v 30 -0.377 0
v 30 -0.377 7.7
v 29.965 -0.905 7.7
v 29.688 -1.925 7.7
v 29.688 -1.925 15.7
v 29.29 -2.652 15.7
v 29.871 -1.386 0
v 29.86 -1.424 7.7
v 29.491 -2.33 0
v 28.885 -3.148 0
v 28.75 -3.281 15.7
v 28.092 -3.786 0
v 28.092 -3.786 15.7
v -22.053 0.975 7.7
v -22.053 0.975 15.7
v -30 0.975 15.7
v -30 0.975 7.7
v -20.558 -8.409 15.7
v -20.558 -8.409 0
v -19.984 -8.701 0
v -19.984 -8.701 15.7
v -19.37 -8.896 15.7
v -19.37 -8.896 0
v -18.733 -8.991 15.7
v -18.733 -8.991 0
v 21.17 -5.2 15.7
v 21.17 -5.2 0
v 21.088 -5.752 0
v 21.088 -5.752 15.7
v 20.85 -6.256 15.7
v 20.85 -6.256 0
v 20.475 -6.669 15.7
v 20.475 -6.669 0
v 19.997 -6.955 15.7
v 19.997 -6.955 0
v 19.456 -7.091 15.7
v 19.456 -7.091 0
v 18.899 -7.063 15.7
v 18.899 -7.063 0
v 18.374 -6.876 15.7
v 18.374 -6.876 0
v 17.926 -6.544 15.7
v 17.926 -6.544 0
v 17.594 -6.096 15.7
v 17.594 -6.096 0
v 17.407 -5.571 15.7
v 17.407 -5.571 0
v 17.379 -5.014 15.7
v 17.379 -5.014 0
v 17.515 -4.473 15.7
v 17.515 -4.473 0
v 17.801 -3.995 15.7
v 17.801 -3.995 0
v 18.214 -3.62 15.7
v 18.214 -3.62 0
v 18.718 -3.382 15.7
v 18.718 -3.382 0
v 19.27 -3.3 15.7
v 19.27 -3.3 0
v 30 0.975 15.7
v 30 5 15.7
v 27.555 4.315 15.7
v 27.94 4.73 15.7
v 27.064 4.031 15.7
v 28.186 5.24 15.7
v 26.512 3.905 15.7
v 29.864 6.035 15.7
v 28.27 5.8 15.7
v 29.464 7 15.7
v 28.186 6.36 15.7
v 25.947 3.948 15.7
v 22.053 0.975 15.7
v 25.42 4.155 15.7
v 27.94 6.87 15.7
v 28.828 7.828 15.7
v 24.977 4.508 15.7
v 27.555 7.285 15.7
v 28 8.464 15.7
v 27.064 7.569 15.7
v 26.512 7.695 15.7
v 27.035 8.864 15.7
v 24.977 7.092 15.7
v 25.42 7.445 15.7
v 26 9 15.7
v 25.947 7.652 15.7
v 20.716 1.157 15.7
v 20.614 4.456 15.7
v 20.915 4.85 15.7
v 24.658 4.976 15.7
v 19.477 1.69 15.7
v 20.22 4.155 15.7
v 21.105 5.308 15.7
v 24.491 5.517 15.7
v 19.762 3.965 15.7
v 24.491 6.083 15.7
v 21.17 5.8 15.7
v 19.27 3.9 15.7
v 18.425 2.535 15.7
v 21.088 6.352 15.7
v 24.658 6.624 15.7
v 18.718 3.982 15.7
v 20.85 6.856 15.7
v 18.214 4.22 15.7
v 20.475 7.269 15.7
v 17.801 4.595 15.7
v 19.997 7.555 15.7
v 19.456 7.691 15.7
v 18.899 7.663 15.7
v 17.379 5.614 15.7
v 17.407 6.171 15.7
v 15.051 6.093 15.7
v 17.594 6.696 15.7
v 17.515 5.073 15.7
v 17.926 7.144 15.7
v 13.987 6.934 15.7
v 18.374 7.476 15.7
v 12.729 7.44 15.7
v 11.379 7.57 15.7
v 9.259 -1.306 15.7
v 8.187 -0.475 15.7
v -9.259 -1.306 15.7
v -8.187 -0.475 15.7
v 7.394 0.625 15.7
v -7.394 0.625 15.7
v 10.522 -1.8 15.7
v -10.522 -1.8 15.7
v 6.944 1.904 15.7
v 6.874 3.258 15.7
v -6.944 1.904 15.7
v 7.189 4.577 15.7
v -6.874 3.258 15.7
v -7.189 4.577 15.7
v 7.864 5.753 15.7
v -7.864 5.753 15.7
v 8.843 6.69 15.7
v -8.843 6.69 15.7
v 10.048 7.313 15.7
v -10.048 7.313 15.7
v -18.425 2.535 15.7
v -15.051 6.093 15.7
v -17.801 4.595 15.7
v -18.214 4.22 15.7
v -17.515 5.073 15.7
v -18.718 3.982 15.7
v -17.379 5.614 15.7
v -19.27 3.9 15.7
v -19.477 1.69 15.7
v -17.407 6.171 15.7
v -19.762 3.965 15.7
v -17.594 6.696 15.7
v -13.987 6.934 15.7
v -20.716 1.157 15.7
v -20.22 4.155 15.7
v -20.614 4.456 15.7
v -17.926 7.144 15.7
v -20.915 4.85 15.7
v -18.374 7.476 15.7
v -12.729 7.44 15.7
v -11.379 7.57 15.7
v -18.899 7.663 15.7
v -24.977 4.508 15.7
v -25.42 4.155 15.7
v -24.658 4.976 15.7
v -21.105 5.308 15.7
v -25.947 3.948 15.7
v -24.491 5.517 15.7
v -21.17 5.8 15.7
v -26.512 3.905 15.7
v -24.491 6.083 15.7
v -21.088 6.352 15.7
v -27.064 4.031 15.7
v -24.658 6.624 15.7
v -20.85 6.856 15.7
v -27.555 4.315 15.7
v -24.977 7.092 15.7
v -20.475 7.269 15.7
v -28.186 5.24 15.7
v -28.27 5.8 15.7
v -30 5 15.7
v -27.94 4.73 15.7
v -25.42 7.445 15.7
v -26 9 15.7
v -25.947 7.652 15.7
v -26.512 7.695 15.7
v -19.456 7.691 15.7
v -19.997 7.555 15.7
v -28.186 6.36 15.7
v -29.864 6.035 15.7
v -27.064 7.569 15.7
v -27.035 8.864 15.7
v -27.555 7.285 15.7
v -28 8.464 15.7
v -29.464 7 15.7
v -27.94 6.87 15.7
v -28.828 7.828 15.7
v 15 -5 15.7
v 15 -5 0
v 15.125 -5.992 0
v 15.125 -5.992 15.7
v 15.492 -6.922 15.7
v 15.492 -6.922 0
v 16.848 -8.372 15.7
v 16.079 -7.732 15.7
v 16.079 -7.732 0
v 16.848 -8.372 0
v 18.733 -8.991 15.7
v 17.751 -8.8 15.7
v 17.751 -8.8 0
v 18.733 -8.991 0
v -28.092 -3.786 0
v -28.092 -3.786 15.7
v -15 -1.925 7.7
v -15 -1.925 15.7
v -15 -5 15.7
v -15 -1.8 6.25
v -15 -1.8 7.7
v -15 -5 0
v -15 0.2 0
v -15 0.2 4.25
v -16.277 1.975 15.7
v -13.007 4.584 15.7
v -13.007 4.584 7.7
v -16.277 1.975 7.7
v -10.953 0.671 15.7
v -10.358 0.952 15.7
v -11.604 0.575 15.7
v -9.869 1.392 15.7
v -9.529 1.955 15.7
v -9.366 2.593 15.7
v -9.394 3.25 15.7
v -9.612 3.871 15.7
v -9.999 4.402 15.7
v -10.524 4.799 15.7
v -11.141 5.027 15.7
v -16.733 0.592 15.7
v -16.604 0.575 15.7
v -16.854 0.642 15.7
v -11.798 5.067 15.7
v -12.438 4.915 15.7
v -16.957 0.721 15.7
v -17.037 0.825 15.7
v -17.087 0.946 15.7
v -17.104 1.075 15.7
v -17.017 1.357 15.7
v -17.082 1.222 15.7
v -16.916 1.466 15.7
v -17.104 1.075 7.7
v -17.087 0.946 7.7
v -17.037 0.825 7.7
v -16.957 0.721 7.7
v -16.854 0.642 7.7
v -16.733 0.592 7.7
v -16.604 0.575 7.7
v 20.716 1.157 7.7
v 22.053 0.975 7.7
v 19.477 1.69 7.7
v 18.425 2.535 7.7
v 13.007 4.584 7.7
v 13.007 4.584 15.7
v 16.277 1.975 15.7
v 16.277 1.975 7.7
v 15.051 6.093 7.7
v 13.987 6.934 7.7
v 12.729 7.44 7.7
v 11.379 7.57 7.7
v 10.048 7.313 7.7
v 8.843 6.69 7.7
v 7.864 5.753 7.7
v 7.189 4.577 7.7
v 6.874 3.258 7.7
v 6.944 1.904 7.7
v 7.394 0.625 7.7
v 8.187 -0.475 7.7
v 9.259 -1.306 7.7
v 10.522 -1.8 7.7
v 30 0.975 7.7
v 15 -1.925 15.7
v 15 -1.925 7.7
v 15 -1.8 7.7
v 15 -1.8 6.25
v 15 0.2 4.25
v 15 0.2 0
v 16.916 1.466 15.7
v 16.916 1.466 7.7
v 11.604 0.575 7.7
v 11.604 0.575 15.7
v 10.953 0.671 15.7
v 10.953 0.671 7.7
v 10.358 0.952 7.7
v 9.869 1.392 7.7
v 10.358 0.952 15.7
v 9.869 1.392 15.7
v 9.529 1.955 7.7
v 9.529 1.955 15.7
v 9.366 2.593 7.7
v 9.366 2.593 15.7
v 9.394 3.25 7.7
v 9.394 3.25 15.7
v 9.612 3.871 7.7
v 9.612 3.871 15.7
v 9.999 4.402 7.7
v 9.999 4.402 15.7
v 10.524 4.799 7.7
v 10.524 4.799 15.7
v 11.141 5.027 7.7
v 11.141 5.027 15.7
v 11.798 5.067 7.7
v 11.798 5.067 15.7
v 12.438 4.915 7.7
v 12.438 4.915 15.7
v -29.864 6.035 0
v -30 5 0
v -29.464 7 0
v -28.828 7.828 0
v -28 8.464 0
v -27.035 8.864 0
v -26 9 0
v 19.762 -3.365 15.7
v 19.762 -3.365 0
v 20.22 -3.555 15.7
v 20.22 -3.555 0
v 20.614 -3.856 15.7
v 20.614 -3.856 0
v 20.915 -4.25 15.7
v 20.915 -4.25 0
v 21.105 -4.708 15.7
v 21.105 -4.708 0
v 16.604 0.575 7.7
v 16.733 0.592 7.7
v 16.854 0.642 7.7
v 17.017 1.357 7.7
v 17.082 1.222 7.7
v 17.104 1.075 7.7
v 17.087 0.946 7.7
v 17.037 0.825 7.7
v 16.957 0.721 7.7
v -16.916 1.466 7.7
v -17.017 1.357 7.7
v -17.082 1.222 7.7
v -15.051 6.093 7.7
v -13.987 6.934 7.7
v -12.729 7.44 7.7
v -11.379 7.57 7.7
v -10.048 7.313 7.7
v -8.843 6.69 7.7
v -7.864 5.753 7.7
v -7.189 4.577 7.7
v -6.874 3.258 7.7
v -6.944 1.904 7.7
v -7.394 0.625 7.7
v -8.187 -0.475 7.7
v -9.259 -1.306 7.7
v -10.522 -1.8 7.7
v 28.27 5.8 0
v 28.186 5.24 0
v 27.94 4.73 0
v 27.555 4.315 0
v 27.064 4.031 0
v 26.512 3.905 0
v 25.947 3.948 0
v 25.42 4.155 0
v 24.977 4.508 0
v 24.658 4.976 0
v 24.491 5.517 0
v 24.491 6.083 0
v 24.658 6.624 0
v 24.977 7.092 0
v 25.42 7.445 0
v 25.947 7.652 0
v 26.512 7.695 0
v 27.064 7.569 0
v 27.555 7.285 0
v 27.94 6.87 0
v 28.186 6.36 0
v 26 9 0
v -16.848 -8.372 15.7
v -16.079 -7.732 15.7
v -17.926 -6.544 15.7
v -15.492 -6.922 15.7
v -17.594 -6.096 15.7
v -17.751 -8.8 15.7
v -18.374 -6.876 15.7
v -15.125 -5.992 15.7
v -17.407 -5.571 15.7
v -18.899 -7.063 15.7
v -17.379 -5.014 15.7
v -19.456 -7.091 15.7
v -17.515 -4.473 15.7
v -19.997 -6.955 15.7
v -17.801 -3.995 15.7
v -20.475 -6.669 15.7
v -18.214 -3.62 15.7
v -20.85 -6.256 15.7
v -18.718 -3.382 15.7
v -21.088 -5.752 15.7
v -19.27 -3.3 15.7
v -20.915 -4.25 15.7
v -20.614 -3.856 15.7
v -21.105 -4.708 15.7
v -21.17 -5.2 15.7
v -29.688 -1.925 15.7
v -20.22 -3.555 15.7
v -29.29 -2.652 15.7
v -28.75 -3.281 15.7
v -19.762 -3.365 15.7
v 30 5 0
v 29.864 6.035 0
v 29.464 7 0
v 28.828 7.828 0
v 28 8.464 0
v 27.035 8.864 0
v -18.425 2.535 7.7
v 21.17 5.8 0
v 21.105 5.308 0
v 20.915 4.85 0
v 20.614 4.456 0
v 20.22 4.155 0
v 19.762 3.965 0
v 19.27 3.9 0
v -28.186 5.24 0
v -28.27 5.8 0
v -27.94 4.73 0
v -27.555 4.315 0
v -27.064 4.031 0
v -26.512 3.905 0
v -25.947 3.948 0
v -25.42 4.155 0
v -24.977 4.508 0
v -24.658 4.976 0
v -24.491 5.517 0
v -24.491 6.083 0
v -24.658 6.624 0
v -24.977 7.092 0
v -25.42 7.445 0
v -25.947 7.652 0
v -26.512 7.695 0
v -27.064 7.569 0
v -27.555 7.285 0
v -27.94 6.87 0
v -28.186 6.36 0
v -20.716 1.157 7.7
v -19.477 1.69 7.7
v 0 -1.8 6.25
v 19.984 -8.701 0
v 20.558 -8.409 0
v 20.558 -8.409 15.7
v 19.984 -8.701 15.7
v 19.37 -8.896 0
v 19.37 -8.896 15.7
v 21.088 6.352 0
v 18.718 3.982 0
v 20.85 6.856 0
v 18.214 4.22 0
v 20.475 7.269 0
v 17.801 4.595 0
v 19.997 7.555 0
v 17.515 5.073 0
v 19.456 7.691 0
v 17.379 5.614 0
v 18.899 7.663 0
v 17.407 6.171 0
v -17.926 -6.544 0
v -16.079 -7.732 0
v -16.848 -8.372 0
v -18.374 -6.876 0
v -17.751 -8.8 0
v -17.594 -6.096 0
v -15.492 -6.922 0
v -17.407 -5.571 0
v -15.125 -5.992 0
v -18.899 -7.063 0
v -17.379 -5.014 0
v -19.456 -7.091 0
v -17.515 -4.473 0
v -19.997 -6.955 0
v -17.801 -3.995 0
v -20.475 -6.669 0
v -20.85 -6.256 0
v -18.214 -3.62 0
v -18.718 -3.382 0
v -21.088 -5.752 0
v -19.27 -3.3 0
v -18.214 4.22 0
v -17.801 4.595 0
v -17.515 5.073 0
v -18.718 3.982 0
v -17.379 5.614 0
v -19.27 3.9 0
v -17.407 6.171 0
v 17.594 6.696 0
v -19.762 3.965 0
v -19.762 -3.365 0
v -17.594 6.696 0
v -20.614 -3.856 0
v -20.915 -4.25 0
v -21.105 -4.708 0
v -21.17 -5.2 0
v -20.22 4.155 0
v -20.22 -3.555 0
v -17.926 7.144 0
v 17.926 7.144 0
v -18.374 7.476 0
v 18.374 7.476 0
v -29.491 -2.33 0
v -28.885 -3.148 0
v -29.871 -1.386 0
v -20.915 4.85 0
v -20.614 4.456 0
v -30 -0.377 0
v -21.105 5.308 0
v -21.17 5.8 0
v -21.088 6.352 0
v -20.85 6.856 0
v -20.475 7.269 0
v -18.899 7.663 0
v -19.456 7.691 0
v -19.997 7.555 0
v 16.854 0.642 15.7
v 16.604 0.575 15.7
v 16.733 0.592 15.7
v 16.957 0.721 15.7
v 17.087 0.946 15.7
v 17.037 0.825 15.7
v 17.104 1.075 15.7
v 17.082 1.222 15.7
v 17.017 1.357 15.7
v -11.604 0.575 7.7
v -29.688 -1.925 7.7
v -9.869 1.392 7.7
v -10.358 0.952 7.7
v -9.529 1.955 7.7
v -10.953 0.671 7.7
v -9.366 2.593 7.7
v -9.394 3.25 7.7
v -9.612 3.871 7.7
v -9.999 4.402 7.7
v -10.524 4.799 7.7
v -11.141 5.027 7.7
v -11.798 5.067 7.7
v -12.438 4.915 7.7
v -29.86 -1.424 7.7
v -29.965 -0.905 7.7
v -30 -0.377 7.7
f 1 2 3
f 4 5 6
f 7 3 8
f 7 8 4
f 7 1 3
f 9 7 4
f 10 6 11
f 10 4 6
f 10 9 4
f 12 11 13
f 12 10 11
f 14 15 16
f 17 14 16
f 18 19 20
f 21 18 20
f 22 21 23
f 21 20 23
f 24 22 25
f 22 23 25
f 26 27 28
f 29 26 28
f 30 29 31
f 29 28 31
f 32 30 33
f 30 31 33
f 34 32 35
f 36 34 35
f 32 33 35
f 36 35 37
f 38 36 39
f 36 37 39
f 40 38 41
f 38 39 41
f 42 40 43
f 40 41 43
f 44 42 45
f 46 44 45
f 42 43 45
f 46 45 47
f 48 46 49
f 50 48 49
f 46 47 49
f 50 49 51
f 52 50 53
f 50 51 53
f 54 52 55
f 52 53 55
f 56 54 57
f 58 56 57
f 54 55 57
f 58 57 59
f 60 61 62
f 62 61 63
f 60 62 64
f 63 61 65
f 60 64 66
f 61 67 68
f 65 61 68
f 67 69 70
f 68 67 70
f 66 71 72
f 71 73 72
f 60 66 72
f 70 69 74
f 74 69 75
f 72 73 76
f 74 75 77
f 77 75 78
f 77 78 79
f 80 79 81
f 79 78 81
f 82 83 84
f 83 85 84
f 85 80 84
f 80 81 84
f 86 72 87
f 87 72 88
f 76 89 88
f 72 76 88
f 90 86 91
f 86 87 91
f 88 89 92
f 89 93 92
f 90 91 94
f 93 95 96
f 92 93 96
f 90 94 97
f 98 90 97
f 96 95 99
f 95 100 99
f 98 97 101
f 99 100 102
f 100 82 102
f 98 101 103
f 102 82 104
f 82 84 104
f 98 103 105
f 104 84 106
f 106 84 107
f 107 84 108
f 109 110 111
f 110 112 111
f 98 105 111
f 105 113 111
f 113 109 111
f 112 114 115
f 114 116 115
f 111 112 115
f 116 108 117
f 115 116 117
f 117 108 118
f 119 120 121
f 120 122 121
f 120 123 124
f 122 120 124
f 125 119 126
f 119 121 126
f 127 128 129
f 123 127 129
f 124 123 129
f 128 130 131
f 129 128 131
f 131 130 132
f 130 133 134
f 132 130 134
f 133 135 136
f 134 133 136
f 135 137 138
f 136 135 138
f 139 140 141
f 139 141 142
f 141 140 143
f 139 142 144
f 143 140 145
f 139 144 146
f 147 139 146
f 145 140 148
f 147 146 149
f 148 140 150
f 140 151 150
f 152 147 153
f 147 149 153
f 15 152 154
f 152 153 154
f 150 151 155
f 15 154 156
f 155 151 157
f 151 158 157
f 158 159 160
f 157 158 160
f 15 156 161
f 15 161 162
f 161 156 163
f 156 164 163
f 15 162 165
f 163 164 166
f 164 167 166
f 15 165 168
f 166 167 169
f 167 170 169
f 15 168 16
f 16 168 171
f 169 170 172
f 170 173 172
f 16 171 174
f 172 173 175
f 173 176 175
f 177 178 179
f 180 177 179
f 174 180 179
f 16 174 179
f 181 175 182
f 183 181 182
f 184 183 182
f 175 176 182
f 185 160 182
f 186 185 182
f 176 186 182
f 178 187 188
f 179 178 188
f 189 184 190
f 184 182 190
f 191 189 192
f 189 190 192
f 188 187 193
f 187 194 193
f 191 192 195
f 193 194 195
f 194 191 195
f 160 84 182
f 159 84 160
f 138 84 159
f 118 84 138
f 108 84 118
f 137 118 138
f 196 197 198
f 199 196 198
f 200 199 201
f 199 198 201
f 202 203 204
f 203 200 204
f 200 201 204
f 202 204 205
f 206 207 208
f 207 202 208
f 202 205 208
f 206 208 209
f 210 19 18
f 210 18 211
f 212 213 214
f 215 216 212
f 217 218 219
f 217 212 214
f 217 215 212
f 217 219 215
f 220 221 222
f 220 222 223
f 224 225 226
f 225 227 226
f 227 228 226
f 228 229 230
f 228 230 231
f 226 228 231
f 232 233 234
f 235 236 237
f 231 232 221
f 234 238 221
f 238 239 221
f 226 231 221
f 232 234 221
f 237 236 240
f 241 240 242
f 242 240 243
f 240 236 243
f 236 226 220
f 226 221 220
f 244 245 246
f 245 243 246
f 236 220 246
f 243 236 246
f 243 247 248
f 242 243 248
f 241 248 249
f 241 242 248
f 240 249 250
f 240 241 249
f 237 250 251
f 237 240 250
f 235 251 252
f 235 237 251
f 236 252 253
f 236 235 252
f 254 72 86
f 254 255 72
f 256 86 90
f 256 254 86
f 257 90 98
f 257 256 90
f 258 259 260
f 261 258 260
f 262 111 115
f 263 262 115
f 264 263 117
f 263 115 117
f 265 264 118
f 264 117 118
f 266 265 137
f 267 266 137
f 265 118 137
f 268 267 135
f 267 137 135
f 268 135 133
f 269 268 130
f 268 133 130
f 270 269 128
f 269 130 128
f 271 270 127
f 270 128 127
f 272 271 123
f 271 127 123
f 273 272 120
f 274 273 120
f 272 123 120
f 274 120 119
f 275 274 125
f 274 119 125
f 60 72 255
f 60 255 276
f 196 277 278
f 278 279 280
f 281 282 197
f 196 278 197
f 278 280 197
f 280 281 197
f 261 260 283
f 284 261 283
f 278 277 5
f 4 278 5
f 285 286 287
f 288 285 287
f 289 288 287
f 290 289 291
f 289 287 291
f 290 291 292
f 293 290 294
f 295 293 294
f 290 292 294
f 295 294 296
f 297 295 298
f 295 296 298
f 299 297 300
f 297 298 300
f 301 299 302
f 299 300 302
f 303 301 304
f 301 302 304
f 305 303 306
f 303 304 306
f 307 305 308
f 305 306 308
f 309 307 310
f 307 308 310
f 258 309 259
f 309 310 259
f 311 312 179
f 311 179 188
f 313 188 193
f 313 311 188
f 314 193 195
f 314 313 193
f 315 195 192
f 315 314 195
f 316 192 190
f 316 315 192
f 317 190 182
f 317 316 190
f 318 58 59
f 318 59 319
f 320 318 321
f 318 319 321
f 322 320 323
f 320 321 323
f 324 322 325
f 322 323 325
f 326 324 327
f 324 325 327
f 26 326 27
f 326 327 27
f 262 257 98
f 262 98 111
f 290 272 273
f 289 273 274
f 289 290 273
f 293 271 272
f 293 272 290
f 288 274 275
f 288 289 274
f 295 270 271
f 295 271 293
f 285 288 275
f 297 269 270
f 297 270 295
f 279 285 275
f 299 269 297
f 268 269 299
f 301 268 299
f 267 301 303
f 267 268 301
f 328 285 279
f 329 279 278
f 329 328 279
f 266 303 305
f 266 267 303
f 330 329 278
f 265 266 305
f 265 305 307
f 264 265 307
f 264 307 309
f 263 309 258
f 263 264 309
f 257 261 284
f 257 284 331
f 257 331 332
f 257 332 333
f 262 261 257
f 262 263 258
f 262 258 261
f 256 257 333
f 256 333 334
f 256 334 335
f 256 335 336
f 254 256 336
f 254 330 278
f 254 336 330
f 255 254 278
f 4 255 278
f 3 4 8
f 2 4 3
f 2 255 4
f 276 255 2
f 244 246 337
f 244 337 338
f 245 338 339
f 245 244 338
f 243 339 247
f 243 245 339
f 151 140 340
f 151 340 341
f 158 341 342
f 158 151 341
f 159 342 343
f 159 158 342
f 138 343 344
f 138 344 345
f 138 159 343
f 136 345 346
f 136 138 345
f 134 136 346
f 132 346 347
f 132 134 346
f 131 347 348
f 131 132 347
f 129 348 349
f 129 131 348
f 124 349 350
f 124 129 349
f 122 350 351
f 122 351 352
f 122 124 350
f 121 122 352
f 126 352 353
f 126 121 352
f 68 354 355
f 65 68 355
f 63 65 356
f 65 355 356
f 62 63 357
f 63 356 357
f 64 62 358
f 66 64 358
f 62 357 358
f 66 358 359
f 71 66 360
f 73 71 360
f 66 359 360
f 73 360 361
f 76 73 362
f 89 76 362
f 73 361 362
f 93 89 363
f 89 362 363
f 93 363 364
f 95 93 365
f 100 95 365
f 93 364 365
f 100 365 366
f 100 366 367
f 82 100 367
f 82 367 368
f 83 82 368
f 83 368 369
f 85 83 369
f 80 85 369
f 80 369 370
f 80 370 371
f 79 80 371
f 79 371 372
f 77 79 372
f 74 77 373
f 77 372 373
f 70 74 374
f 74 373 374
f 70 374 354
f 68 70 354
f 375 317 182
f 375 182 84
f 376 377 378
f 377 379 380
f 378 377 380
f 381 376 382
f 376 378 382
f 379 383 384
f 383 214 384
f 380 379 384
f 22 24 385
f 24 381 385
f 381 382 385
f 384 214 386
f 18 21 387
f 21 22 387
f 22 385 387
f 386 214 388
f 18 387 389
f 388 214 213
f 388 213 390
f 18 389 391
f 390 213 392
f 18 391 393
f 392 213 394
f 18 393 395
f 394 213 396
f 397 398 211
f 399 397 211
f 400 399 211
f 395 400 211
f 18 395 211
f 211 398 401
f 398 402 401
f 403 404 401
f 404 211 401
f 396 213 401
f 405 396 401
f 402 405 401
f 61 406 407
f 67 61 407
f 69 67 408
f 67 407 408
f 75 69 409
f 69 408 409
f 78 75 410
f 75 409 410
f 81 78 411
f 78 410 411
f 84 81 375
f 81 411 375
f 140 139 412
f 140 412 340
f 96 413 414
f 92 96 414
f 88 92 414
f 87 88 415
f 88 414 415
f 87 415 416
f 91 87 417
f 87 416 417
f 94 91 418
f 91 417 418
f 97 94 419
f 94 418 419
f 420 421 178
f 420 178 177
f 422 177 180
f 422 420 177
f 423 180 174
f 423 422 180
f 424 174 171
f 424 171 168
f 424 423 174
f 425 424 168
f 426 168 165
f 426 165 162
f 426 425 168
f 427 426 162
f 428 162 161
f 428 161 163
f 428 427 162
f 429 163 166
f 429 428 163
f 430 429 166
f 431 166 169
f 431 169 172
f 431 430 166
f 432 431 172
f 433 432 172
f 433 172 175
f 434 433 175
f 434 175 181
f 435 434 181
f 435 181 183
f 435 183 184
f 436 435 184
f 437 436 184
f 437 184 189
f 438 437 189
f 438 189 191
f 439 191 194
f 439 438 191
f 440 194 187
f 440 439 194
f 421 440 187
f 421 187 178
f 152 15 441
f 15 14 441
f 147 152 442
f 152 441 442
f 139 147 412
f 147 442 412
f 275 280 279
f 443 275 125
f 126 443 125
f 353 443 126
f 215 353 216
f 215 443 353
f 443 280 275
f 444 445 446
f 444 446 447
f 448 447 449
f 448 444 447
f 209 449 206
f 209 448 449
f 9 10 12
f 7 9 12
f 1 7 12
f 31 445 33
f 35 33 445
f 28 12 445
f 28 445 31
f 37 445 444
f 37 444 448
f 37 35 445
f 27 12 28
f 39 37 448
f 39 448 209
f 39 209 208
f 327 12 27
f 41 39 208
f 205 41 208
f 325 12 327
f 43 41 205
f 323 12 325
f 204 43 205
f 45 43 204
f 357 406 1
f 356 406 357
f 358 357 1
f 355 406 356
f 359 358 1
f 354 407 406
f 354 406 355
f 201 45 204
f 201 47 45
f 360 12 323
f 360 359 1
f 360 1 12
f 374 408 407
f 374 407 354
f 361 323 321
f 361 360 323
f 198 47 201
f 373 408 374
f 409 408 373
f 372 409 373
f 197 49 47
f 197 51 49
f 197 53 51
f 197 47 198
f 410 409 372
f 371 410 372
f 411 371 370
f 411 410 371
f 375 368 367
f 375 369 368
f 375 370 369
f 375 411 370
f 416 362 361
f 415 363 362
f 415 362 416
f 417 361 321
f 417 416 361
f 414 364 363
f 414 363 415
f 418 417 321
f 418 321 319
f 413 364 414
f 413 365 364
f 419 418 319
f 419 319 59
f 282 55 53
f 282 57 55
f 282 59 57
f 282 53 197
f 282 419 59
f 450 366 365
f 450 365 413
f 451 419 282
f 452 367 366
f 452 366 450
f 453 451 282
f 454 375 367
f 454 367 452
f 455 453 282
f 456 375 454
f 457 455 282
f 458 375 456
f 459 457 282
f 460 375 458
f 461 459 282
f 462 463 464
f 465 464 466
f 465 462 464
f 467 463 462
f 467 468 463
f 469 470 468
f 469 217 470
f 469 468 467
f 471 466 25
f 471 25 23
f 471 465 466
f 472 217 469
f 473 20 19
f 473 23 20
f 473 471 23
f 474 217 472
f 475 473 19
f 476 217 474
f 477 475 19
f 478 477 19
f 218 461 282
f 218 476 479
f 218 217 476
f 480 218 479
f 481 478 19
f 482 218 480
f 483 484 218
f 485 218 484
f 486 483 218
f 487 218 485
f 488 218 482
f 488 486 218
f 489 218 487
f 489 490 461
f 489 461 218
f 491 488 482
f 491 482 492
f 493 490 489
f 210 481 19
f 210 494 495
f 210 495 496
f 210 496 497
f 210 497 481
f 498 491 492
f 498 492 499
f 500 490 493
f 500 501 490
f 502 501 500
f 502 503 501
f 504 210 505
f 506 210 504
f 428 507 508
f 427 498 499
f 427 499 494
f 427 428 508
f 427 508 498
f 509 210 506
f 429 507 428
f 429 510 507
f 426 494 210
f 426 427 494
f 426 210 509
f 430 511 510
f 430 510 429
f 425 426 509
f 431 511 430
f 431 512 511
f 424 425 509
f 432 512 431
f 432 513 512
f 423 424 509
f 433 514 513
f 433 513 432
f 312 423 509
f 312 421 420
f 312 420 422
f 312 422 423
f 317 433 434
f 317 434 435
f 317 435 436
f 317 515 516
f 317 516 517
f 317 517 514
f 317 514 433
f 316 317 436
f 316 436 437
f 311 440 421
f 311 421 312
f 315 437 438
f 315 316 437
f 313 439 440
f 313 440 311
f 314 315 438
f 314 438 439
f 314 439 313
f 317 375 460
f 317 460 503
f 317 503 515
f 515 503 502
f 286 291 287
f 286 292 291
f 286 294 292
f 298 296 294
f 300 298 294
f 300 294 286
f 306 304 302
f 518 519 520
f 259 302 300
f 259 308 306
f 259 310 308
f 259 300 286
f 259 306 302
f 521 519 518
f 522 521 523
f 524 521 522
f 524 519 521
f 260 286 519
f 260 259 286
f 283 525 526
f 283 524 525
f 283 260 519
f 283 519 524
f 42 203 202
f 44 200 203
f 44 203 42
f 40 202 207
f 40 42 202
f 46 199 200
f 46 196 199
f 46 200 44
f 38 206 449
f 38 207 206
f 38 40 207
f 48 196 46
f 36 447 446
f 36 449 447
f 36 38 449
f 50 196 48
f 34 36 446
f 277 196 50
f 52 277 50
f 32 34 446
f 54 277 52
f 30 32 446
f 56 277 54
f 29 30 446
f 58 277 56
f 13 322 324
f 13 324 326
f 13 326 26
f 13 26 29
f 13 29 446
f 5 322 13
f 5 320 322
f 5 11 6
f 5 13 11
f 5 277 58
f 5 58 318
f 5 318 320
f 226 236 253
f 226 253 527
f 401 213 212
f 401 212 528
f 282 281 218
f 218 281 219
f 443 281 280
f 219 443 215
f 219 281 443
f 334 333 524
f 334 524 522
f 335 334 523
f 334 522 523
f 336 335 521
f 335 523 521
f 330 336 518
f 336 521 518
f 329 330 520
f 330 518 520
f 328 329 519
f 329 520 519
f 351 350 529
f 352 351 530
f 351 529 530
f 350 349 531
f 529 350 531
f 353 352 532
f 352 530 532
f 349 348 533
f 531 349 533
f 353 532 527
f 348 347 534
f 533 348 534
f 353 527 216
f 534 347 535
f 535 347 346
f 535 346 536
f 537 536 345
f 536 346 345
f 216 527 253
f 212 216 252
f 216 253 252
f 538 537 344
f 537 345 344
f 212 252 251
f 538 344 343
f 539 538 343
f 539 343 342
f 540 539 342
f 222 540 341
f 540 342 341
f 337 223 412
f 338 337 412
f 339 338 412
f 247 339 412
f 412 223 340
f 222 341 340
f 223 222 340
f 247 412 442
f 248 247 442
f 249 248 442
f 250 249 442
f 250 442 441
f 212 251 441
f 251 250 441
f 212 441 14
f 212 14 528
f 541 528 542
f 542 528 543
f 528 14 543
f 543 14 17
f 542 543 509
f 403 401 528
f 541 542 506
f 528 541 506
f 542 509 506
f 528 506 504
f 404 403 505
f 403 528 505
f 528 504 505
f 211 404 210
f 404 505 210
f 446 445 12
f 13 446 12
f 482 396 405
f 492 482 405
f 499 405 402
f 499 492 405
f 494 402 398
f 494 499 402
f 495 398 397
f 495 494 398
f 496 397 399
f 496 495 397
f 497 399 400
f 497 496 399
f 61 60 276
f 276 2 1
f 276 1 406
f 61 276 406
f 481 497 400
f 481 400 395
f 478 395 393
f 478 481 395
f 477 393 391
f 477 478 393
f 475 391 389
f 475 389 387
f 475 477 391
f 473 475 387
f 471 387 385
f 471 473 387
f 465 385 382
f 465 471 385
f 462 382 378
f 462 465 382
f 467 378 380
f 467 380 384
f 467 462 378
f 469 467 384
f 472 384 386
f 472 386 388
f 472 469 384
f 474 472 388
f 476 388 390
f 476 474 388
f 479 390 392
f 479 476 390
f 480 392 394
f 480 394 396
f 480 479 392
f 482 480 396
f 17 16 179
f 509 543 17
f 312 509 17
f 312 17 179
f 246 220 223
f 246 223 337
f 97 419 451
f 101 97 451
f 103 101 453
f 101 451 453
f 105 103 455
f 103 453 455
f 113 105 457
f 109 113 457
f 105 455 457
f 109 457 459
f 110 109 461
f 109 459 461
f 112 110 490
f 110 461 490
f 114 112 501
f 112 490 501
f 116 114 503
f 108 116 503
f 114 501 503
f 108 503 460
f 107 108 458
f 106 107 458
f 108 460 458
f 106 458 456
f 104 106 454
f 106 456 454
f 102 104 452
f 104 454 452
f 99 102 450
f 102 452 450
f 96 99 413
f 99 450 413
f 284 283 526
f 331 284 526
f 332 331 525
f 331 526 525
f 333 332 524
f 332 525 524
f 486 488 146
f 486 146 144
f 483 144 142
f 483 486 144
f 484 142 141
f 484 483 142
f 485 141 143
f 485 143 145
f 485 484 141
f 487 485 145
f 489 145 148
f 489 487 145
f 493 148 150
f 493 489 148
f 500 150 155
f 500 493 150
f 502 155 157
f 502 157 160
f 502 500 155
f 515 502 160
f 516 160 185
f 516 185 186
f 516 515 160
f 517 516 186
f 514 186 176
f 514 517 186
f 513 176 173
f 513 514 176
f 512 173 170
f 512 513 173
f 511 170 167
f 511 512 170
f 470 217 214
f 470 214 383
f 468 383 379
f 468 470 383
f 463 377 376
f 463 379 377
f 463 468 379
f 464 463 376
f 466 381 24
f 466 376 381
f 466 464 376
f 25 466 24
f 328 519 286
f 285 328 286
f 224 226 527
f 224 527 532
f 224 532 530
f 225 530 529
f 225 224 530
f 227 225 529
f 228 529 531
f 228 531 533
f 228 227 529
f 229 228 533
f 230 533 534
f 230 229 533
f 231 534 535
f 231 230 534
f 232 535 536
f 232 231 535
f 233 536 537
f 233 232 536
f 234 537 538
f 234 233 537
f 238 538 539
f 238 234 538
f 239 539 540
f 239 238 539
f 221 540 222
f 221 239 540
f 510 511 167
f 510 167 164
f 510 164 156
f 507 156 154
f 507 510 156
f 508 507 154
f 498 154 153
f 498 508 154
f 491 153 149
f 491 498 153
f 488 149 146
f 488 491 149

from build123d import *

# Parameters (mm, degrees)
F1_DEPTH    = 15.7
F2_W        = 10.0960650777
F2_H        = 2.9
F3_DEPTH    = 8
F4_R        = 5
F5_T1_DEPTH = 26.8923143391
F5_T3_DEPTH = 21.3473434867
F5_T5_DEPTH = 35.7
F6_W        = 15
F6_H        = 6.25
F7_DEPTH    = 2
F8_SIZE     = 1.99999


# Not quite as in the source:
# - a fillet or chamfer that OpenCascade refuses, or shapes differently, is made with other operations: its cross-section is extruded or revolved along the edge and cut away or added
# - a fillet or chamfer is up to 0.001 mm smaller than in the source, because OpenCascade refuses the exact size


with BuildPart() as f1:
    # F0 (on Top) → F1 (new body)
    with BuildSketch(Plane.XY):
        Polygon((30, 9), (0, 9), (0, -1.8), (15, -1.8), (15, -9), (19.5954625243, -9), (30, -2.6151265483), align=None)
        with BuildLine():
            ThreePointArc((21.17, -5.2), (17.9264971157, -6.5435028843), (19.27, -3.3))
            ThreePointArc((19.27, -3.3), (20.6135028843, -3.8564971157), (21.17, -5.2))
        make_face(mode=Mode.SUBTRACT)
        with BuildLine():
            ThreePointArc((19.27, 3.9), (17.9264971157, 7.1435028843), (21.17, 5.8))
            ThreePointArc((21.17, 5.8), (20.6135028843, 4.4564971157), (19.27, 3.9))
        make_face(mode=Mode.SUBTRACT)
        with BuildLine():
            ThreePointArc((24.47, 5.8), (26.37, 7.7), (28.27, 5.8))
            ThreePointArc((28.27, 5.8), (26.37, 3.9), (24.47, 5.8))
        make_face(mode=Mode.SUBTRACT)
    extrude(amount=F1_DEPTH)

    # F2 (on face) → F3 (cut)
    with BuildSketch(Plane.XY.offset(15.7)):
        with BuildLine():
            ThreePointArc((11.6039349223, 0.5750306588), (9.4802536205, 3.5683191144), (13.0070529624, 4.5839393448))
            Line((13.0070529624, 4.5839393448), (16.2772942688, 1.9751998411))
            ThreePointArc((16.2772942688, 1.9751998411), (16.3347359589, 2.3983908199), (16.3539349223, 2.8250306588))
            ThreePointArc((16.3539349223, 2.8250306588), (16.0161356009, 4.5842876531), (15.050783271, 6.09332325))
            ThreePointArc((15.050783271, 6.09332325), (7.4840088208, 5.1890756918), (10.5215341623, -1.8))
            Line((10.5215341623, -1.8), (12.6863356823, -1.8))
            ThreePointArc((12.6863356823, -1.8), (14.4922032842, -0.9459646832), (15.787235055, 0.5750306588))
            Line((15.787235055, 0.5750306588), (11.6039349223, 0.5750306588))
        make_face()
        with BuildLine():
            ThreePointArc((16.3539349223, 2.8250306588), (16.3347359589, 2.3983908199), (16.2772942688, 1.9751998411))
            Line((16.2772942688, 1.9751998411), (16.9157389312, 1.4658992557))
            ThreePointArc((16.9157389312, 1.4658992557), (17.0544357572, 1.2919384682), (17.1039349223, 1.0750306588))
            ThreePointArc((17.1039349223, 1.0750306588), (16.9574883129, 0.7214772682), (16.6039349223, 0.5750306588))
            Line((16.6039349223, 0.5750306588), (15.787235055, 0.5750306588))
            ThreePointArc((15.787235055, 0.5750306588), (14.4922032842, -0.9459646832), (12.6863356823, -1.8))
            Line((12.6863356823, -1.8), (15, -1.8))
            Line((15, -1.8), (15, -1.9249693412))
            Line((15, -1.9249693412), (19.9039349223, -1.9249693412))
            Line((19.9039349223, -1.9249693412), (19.9039349223, 0.9750306588))
            Line((19.9039349223, 0.9750306588), (15.050783271, 6.09332325))
            ThreePointArc((15.050783271, 6.09332325), (16.0161356009, 4.5842876531), (16.3539349223, 2.8250306588))
        make_face()
        with Locations((24.9519674612, -0.4749693412)):
            Rectangle(F2_W, F2_H)
    extrude(amount=-F3_DEPTH, mode=Mode.SUBTRACT)

    # F4
    f4_edges = [f1.edges().sort_by_distance(p)[0] for p in [
        (19.903935, 0.975031, 11.7),
    ]]
    fillet(f4_edges, radius=F4_R)

    # F5: fillet of radius 4 on 4 edges, made by hand

    # F5_s2 → F5_t1 (cut)
    with BuildSketch(Plane.XY.offset(-5.5961571696)):
        with BuildLine():
            ThreePointArc((30, -0.3766636805), (29.4905957559, -2.3300559271), (28.0921293656, -3.7859150232))
            Line((28.0921293656, -3.7859150232), (30, -2.6151265483))
            Line((30, -2.6151265483), (30, -0.3766636805))
        make_face()
    extrude(amount=F5_T1_DEPTH, mode=Mode.SUBTRACT)

    # F5_s4 → F5_t3 (cut)
    with BuildSketch(Plane.XY.offset(-2.8236717433)):
        with BuildLine():
            ThreePointArc((20.5581231925, -8.4092513427), (19.5529608525, -8.8494808332), (18.465993827, -9))
            Line((18.465993827, -9), (19.5954625243, -9))
            Line((19.5954625243, -9), (20.5581231925, -8.4092513427))
        make_face()
    extrude(amount=F5_T3_DEPTH, mode=Mode.SUBTRACT)

    # F5_s6 → F5_t5 (cut)
    with BuildSketch(Plane.XY.offset(-10)):
        with BuildLine():
            ThreePointArc((15, -5), (16.1715728753, -7.8284271247), (19, -9))
            Line((19, -9), (15, -9))
            Line((15, -9), (15, -5))
        make_face()
        with BuildLine():
            ThreePointArc((30, 5), (28.8284271247, 7.8284271247), (26, 9))
            Line((26, 9), (30, 9))
            Line((30, 9), (30, 5))
        make_face()
    extrude(amount=F5_T5_DEPTH, mode=Mode.SUBTRACT)

    # F6 (on face) → F7 (cut)
    with BuildSketch(Plane.XZ.offset(1.8)):
        with Locations((7.5, 3.125)):
            Rectangle(F6_W, F6_H)
    extrude(amount=-F7_DEPTH, mode=Mode.SUBTRACT)

    # F8 (size 2 in the source; OpenCascade refuses exactly that, so slightly less here)
    f8_edges = [f1.edges().sort_by_distance(p)[0] for p in [
        (7.5, 0.2, 6.25),
    ]]
    chamfer(f8_edges, length=F8_SIZE)

    # F9: F1 across plane


with BuildPart() as f1_1:
    add(f1.part)
    add(f1.part.mirror(Plane.YZ))


solid = f1_1.part
